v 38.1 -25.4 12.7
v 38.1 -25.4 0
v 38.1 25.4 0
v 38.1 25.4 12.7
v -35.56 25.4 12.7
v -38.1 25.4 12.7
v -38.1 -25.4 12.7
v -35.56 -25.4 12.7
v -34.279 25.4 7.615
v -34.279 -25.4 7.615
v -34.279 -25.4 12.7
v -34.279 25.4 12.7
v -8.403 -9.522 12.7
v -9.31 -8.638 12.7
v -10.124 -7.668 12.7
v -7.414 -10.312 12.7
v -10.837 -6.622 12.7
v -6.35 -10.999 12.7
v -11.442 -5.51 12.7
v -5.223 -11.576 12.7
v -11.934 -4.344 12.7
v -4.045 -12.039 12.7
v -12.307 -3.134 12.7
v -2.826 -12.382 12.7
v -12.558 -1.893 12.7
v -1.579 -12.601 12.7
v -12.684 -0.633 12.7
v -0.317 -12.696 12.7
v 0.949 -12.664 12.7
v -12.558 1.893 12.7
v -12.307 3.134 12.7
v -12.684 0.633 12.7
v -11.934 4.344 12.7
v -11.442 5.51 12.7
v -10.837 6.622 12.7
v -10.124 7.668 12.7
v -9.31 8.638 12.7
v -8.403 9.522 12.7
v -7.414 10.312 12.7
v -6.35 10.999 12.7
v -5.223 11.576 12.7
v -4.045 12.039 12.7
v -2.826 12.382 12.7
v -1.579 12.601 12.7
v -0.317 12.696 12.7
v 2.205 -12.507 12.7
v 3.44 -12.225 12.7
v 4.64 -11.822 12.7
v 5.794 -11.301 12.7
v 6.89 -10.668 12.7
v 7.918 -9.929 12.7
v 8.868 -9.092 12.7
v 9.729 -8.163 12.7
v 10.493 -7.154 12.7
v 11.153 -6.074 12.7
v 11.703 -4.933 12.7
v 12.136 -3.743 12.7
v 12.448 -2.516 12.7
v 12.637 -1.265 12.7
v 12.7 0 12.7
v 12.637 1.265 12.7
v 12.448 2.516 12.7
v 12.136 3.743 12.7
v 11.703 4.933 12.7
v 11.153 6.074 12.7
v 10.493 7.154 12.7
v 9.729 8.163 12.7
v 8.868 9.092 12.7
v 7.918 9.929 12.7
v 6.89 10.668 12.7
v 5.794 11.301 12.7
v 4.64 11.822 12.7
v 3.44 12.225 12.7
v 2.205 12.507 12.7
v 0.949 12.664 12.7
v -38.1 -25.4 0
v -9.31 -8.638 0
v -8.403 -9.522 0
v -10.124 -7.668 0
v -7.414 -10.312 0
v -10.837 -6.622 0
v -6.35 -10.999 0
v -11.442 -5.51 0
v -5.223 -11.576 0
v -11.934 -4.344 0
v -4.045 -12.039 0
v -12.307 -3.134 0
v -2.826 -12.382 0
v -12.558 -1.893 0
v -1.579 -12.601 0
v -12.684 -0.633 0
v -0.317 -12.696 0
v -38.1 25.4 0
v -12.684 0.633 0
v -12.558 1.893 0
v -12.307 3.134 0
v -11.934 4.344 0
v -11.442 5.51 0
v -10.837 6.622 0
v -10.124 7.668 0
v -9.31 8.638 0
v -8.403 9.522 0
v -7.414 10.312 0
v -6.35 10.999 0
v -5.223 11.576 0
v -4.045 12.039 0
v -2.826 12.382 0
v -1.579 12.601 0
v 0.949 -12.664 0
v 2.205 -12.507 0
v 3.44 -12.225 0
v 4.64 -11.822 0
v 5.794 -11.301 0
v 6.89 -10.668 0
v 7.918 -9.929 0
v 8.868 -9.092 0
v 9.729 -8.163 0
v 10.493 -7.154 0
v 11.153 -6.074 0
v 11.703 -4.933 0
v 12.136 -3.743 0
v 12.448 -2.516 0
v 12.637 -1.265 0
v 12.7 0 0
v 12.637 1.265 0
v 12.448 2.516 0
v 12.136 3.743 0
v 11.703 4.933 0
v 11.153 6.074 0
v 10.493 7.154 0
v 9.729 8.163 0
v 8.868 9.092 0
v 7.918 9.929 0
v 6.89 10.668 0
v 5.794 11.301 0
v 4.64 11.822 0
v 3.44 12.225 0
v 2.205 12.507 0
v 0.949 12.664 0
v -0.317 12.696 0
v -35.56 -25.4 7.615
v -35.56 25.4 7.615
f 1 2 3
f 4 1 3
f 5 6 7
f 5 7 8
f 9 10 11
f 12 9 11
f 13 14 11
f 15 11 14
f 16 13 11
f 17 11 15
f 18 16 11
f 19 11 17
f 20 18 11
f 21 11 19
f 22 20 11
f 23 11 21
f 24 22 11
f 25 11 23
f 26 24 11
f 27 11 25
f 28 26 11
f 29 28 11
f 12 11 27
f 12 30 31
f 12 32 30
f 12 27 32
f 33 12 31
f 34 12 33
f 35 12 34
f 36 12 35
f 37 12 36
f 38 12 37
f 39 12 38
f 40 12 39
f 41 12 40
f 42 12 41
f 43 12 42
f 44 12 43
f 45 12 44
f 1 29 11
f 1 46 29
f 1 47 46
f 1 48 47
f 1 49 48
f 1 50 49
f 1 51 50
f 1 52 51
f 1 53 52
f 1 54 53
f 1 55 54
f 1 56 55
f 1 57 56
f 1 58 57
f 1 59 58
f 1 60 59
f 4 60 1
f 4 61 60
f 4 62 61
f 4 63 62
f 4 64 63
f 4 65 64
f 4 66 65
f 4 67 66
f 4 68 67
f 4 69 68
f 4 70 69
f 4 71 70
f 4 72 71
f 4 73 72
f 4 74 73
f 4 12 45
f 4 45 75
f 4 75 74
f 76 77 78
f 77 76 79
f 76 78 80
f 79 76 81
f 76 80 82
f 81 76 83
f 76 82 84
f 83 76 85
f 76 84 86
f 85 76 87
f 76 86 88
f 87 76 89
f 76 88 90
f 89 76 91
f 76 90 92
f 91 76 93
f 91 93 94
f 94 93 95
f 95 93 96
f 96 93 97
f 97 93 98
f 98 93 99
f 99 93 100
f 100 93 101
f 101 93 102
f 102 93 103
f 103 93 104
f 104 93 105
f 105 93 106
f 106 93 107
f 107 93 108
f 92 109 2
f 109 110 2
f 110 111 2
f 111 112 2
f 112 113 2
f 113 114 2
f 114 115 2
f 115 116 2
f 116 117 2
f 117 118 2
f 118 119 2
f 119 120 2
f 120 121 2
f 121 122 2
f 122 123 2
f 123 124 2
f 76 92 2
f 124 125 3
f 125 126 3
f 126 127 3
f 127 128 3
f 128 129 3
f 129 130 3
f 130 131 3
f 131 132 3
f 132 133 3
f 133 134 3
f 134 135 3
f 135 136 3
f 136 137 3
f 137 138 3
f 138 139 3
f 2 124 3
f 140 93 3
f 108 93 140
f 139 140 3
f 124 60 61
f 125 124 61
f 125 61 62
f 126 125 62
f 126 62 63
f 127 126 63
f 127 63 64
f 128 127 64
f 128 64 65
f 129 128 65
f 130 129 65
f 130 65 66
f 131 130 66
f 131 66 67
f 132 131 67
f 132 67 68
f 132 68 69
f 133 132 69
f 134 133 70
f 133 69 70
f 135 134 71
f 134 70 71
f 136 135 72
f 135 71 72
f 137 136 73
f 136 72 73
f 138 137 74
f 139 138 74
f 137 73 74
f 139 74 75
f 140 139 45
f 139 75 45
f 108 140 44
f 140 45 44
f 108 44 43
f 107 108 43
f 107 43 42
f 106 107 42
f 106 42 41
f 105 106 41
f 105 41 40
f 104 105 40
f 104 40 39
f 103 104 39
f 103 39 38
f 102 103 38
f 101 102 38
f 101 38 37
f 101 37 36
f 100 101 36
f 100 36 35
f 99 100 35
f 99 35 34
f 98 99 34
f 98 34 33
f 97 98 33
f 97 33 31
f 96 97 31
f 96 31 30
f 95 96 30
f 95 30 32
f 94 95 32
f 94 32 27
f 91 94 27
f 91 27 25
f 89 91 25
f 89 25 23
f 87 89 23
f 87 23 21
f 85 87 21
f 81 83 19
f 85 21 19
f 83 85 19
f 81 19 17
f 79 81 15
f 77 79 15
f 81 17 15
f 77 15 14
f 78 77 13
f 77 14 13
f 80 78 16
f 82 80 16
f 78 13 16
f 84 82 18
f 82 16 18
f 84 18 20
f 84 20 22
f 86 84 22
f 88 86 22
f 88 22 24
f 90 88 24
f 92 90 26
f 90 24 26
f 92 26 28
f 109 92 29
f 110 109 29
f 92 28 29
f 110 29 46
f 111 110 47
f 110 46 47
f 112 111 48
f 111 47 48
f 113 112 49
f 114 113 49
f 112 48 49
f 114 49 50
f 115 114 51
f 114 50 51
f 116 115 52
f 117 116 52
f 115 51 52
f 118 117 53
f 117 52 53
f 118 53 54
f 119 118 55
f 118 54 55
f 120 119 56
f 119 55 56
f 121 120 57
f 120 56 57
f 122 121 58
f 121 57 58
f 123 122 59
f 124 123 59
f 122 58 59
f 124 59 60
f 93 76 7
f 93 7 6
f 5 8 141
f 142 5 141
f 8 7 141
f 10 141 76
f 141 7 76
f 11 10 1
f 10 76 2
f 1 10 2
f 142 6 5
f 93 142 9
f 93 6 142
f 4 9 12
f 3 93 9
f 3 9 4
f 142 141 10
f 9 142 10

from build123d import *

# Parameters (mm, degrees)
F0_W     = 76.2
F0_H     = 50.8
F1_DEPTH = 12.7
F2_R     = 12.7
F3_DEPTH = 25.4
F4_W     = 1.281619072
F4_H     = 0.3408930868
F4_H_2   = 4.7445660457
F5_DEPTH = 50.8508


with BuildPart() as f1:
    # F0 (on Top) → F1 (new body)
    with BuildSketch(Plane.XY):
        Rectangle(F0_W, F0_H)
    extrude(amount=F1_DEPTH)

    # F2 (on face) → F3 (cut)
    with BuildSketch(Plane.XY.offset(12.7)):
        Circle(F2_R)
    extrude(amount=-F3_DEPTH, mode=Mode.SUBTRACT)

    # F4 (on face) → F5 (cut)
    with BuildSketch(Plane.XZ.offset(25.4)):
        with Locations((-34.9193550646, 12.5295534566)):
            Rectangle(F4_W, F4_H)
        with Locations((-34.9193550646, 9.9868238904)):
            Rectangle(F4_W, F4_H_2)
    extrude(amount=-F5_DEPTH, mode=Mode.SUBTRACT)


solid = f1.part
